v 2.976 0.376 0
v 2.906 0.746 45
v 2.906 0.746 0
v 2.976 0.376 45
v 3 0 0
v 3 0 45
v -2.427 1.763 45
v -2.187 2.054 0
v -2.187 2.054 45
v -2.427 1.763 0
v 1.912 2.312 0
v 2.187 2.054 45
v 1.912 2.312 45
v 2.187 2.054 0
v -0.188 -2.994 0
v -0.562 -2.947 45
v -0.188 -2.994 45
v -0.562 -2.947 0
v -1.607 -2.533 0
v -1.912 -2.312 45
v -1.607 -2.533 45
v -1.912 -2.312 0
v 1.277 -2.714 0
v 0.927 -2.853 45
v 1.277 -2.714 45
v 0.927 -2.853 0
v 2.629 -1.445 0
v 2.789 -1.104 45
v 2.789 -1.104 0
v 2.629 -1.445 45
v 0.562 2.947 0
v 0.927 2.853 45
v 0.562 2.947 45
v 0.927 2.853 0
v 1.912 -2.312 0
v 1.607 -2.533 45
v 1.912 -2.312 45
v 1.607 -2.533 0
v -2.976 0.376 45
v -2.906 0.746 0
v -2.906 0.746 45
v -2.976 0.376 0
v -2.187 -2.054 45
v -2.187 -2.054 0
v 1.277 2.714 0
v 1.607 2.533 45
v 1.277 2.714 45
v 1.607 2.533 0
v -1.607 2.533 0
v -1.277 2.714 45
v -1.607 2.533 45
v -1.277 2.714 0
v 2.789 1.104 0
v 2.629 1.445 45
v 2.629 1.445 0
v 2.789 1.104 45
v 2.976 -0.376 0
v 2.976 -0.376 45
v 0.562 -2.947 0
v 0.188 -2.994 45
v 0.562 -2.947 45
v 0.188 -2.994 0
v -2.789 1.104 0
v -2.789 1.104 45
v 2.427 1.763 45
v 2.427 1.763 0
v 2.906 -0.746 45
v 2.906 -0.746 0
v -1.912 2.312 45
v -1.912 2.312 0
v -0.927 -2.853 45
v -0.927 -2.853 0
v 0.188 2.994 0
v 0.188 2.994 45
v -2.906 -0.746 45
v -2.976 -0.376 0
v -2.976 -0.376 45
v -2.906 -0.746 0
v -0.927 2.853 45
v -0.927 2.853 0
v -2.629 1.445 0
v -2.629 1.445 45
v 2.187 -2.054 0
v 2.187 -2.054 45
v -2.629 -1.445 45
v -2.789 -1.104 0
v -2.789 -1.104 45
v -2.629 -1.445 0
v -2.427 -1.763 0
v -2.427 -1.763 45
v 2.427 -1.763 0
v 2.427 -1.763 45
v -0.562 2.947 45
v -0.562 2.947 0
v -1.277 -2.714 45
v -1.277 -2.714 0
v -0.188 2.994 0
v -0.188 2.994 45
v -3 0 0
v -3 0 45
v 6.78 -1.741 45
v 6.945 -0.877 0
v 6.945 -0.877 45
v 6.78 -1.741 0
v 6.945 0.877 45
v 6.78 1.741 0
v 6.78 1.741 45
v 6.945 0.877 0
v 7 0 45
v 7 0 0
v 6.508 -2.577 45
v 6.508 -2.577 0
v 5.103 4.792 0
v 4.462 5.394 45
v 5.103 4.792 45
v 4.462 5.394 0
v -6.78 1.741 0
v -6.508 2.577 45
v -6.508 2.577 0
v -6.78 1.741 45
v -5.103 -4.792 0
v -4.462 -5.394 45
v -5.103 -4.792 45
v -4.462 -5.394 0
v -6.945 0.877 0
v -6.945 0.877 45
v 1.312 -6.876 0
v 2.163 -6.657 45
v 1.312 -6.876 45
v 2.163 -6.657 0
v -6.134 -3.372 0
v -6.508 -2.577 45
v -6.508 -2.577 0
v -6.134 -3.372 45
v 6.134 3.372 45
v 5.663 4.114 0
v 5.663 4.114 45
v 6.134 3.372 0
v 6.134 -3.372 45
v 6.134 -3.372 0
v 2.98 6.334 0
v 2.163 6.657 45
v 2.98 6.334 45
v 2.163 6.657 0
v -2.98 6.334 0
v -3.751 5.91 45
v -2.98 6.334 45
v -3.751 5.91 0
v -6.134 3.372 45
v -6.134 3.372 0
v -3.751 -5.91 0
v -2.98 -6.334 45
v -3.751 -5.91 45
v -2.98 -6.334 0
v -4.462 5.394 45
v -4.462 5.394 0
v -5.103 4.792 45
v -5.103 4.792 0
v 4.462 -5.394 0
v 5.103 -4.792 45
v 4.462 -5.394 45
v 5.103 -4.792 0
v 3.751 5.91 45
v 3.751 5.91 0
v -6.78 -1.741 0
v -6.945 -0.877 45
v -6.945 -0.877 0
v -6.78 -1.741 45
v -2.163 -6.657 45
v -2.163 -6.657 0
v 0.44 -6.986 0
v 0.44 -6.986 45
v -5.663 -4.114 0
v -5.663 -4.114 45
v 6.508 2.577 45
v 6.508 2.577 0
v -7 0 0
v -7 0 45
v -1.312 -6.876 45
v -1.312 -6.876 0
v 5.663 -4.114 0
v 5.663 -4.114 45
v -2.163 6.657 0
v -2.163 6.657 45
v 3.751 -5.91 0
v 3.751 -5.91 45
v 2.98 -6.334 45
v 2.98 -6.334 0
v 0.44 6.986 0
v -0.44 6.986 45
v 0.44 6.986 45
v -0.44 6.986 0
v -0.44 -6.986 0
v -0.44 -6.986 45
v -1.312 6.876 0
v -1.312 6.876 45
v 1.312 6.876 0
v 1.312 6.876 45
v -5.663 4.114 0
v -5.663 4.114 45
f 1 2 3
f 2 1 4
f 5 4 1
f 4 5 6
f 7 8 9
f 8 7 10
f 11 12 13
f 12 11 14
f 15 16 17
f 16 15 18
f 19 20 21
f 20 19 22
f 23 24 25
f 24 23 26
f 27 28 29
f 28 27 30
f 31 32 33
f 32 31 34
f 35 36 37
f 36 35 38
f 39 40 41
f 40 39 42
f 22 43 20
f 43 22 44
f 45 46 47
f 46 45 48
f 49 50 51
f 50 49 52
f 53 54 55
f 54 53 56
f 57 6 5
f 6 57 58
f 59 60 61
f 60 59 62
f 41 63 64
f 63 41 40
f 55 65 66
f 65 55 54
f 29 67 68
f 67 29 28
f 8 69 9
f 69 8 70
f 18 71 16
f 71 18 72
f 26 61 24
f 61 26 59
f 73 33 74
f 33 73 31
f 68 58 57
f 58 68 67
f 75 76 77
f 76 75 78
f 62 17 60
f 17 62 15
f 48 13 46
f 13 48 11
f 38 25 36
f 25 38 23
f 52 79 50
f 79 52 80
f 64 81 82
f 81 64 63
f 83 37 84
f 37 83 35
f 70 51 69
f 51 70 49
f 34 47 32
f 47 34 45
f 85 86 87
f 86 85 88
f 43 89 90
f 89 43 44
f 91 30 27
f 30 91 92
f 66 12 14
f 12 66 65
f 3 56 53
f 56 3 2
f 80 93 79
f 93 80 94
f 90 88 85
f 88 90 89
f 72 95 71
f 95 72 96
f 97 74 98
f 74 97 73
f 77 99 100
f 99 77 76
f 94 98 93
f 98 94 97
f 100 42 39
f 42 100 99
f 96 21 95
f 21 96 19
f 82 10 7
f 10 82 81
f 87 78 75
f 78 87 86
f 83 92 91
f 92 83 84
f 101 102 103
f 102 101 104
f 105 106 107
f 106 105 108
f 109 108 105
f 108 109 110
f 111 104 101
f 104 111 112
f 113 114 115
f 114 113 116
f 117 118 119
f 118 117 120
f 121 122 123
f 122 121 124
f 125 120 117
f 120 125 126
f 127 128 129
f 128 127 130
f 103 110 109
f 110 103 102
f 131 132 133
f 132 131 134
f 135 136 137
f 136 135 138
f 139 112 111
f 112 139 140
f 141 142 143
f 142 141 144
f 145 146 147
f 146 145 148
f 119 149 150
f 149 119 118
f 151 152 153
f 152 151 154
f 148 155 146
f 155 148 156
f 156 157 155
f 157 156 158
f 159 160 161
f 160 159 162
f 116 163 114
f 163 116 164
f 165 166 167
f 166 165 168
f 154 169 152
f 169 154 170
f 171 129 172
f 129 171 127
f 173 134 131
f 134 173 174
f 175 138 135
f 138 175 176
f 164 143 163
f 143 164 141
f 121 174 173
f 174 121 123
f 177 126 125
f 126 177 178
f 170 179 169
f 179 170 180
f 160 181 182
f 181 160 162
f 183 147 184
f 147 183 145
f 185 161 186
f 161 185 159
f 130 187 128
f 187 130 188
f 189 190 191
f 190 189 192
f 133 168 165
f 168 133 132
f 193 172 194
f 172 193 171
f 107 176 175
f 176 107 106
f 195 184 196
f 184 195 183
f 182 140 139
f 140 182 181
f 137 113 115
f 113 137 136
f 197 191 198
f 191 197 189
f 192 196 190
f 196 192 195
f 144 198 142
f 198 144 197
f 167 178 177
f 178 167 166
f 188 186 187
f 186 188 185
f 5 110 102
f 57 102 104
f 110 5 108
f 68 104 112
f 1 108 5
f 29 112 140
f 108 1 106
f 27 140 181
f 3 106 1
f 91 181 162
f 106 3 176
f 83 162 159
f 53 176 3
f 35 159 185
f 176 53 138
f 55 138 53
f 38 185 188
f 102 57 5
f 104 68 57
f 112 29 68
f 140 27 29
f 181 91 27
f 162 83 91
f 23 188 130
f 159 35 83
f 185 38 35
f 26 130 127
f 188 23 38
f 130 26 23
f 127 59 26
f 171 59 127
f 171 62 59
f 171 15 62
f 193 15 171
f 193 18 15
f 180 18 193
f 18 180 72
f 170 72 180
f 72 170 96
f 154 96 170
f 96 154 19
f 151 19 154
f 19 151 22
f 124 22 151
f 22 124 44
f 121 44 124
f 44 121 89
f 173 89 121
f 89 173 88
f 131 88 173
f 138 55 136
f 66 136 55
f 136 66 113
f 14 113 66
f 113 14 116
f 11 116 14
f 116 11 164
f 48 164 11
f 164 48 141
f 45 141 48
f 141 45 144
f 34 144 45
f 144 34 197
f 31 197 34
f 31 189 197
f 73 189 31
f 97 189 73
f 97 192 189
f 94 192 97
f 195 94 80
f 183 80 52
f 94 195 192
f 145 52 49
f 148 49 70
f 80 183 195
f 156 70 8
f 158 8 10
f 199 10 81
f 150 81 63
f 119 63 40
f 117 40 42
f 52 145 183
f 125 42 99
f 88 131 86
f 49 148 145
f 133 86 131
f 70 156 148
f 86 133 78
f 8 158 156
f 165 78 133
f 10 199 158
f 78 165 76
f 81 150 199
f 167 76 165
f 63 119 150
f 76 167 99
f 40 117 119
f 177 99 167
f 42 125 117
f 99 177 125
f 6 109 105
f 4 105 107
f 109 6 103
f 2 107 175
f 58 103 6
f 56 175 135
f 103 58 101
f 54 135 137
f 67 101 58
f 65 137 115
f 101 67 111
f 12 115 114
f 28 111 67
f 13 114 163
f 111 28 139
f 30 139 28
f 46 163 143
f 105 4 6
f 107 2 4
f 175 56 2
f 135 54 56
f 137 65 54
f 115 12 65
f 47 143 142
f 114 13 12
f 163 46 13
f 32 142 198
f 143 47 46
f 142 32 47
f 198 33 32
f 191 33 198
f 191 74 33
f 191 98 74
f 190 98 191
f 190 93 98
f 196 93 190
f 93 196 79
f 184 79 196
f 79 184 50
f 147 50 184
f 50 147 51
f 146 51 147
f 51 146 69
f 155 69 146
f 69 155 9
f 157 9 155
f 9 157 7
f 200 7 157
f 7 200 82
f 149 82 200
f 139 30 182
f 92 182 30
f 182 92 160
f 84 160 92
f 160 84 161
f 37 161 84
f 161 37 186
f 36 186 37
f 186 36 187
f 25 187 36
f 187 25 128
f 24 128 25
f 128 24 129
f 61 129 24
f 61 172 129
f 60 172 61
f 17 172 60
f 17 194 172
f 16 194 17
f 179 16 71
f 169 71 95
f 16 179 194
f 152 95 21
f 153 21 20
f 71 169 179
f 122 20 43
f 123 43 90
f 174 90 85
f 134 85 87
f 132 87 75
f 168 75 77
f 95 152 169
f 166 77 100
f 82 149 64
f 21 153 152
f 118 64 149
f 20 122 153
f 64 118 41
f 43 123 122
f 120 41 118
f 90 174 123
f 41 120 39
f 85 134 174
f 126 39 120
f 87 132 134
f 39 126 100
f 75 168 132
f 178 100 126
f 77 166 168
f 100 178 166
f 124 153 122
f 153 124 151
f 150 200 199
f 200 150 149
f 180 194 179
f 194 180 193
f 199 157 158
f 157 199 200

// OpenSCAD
$fn = 50;


difference() {
	union() {
		cylinder(h = 45, r = 7.0000000000);
	}
	union() {
		translate(v = [0.0000000000, 0.0000000000, -100.0000000000]) {
			cylinder(h = 200, r = 3.0000000000);
		}
		translate(v = [0.0000000000, 0.0000000000, -100.0000000000]) {
			cylinder(h = 200, r = 3.0000000000);
		}
		translate(v = [0.0000000000, 0.0000000000, -100.0000000000]) {
			cylinder(h = 200, r = 3.0000000000);
		}
		translate(v = [0.0000000000, 0.0000000000, -100.0000000000]) {
			cylinder(h = 200, r = 3.0000000000);
		}
	}
}
